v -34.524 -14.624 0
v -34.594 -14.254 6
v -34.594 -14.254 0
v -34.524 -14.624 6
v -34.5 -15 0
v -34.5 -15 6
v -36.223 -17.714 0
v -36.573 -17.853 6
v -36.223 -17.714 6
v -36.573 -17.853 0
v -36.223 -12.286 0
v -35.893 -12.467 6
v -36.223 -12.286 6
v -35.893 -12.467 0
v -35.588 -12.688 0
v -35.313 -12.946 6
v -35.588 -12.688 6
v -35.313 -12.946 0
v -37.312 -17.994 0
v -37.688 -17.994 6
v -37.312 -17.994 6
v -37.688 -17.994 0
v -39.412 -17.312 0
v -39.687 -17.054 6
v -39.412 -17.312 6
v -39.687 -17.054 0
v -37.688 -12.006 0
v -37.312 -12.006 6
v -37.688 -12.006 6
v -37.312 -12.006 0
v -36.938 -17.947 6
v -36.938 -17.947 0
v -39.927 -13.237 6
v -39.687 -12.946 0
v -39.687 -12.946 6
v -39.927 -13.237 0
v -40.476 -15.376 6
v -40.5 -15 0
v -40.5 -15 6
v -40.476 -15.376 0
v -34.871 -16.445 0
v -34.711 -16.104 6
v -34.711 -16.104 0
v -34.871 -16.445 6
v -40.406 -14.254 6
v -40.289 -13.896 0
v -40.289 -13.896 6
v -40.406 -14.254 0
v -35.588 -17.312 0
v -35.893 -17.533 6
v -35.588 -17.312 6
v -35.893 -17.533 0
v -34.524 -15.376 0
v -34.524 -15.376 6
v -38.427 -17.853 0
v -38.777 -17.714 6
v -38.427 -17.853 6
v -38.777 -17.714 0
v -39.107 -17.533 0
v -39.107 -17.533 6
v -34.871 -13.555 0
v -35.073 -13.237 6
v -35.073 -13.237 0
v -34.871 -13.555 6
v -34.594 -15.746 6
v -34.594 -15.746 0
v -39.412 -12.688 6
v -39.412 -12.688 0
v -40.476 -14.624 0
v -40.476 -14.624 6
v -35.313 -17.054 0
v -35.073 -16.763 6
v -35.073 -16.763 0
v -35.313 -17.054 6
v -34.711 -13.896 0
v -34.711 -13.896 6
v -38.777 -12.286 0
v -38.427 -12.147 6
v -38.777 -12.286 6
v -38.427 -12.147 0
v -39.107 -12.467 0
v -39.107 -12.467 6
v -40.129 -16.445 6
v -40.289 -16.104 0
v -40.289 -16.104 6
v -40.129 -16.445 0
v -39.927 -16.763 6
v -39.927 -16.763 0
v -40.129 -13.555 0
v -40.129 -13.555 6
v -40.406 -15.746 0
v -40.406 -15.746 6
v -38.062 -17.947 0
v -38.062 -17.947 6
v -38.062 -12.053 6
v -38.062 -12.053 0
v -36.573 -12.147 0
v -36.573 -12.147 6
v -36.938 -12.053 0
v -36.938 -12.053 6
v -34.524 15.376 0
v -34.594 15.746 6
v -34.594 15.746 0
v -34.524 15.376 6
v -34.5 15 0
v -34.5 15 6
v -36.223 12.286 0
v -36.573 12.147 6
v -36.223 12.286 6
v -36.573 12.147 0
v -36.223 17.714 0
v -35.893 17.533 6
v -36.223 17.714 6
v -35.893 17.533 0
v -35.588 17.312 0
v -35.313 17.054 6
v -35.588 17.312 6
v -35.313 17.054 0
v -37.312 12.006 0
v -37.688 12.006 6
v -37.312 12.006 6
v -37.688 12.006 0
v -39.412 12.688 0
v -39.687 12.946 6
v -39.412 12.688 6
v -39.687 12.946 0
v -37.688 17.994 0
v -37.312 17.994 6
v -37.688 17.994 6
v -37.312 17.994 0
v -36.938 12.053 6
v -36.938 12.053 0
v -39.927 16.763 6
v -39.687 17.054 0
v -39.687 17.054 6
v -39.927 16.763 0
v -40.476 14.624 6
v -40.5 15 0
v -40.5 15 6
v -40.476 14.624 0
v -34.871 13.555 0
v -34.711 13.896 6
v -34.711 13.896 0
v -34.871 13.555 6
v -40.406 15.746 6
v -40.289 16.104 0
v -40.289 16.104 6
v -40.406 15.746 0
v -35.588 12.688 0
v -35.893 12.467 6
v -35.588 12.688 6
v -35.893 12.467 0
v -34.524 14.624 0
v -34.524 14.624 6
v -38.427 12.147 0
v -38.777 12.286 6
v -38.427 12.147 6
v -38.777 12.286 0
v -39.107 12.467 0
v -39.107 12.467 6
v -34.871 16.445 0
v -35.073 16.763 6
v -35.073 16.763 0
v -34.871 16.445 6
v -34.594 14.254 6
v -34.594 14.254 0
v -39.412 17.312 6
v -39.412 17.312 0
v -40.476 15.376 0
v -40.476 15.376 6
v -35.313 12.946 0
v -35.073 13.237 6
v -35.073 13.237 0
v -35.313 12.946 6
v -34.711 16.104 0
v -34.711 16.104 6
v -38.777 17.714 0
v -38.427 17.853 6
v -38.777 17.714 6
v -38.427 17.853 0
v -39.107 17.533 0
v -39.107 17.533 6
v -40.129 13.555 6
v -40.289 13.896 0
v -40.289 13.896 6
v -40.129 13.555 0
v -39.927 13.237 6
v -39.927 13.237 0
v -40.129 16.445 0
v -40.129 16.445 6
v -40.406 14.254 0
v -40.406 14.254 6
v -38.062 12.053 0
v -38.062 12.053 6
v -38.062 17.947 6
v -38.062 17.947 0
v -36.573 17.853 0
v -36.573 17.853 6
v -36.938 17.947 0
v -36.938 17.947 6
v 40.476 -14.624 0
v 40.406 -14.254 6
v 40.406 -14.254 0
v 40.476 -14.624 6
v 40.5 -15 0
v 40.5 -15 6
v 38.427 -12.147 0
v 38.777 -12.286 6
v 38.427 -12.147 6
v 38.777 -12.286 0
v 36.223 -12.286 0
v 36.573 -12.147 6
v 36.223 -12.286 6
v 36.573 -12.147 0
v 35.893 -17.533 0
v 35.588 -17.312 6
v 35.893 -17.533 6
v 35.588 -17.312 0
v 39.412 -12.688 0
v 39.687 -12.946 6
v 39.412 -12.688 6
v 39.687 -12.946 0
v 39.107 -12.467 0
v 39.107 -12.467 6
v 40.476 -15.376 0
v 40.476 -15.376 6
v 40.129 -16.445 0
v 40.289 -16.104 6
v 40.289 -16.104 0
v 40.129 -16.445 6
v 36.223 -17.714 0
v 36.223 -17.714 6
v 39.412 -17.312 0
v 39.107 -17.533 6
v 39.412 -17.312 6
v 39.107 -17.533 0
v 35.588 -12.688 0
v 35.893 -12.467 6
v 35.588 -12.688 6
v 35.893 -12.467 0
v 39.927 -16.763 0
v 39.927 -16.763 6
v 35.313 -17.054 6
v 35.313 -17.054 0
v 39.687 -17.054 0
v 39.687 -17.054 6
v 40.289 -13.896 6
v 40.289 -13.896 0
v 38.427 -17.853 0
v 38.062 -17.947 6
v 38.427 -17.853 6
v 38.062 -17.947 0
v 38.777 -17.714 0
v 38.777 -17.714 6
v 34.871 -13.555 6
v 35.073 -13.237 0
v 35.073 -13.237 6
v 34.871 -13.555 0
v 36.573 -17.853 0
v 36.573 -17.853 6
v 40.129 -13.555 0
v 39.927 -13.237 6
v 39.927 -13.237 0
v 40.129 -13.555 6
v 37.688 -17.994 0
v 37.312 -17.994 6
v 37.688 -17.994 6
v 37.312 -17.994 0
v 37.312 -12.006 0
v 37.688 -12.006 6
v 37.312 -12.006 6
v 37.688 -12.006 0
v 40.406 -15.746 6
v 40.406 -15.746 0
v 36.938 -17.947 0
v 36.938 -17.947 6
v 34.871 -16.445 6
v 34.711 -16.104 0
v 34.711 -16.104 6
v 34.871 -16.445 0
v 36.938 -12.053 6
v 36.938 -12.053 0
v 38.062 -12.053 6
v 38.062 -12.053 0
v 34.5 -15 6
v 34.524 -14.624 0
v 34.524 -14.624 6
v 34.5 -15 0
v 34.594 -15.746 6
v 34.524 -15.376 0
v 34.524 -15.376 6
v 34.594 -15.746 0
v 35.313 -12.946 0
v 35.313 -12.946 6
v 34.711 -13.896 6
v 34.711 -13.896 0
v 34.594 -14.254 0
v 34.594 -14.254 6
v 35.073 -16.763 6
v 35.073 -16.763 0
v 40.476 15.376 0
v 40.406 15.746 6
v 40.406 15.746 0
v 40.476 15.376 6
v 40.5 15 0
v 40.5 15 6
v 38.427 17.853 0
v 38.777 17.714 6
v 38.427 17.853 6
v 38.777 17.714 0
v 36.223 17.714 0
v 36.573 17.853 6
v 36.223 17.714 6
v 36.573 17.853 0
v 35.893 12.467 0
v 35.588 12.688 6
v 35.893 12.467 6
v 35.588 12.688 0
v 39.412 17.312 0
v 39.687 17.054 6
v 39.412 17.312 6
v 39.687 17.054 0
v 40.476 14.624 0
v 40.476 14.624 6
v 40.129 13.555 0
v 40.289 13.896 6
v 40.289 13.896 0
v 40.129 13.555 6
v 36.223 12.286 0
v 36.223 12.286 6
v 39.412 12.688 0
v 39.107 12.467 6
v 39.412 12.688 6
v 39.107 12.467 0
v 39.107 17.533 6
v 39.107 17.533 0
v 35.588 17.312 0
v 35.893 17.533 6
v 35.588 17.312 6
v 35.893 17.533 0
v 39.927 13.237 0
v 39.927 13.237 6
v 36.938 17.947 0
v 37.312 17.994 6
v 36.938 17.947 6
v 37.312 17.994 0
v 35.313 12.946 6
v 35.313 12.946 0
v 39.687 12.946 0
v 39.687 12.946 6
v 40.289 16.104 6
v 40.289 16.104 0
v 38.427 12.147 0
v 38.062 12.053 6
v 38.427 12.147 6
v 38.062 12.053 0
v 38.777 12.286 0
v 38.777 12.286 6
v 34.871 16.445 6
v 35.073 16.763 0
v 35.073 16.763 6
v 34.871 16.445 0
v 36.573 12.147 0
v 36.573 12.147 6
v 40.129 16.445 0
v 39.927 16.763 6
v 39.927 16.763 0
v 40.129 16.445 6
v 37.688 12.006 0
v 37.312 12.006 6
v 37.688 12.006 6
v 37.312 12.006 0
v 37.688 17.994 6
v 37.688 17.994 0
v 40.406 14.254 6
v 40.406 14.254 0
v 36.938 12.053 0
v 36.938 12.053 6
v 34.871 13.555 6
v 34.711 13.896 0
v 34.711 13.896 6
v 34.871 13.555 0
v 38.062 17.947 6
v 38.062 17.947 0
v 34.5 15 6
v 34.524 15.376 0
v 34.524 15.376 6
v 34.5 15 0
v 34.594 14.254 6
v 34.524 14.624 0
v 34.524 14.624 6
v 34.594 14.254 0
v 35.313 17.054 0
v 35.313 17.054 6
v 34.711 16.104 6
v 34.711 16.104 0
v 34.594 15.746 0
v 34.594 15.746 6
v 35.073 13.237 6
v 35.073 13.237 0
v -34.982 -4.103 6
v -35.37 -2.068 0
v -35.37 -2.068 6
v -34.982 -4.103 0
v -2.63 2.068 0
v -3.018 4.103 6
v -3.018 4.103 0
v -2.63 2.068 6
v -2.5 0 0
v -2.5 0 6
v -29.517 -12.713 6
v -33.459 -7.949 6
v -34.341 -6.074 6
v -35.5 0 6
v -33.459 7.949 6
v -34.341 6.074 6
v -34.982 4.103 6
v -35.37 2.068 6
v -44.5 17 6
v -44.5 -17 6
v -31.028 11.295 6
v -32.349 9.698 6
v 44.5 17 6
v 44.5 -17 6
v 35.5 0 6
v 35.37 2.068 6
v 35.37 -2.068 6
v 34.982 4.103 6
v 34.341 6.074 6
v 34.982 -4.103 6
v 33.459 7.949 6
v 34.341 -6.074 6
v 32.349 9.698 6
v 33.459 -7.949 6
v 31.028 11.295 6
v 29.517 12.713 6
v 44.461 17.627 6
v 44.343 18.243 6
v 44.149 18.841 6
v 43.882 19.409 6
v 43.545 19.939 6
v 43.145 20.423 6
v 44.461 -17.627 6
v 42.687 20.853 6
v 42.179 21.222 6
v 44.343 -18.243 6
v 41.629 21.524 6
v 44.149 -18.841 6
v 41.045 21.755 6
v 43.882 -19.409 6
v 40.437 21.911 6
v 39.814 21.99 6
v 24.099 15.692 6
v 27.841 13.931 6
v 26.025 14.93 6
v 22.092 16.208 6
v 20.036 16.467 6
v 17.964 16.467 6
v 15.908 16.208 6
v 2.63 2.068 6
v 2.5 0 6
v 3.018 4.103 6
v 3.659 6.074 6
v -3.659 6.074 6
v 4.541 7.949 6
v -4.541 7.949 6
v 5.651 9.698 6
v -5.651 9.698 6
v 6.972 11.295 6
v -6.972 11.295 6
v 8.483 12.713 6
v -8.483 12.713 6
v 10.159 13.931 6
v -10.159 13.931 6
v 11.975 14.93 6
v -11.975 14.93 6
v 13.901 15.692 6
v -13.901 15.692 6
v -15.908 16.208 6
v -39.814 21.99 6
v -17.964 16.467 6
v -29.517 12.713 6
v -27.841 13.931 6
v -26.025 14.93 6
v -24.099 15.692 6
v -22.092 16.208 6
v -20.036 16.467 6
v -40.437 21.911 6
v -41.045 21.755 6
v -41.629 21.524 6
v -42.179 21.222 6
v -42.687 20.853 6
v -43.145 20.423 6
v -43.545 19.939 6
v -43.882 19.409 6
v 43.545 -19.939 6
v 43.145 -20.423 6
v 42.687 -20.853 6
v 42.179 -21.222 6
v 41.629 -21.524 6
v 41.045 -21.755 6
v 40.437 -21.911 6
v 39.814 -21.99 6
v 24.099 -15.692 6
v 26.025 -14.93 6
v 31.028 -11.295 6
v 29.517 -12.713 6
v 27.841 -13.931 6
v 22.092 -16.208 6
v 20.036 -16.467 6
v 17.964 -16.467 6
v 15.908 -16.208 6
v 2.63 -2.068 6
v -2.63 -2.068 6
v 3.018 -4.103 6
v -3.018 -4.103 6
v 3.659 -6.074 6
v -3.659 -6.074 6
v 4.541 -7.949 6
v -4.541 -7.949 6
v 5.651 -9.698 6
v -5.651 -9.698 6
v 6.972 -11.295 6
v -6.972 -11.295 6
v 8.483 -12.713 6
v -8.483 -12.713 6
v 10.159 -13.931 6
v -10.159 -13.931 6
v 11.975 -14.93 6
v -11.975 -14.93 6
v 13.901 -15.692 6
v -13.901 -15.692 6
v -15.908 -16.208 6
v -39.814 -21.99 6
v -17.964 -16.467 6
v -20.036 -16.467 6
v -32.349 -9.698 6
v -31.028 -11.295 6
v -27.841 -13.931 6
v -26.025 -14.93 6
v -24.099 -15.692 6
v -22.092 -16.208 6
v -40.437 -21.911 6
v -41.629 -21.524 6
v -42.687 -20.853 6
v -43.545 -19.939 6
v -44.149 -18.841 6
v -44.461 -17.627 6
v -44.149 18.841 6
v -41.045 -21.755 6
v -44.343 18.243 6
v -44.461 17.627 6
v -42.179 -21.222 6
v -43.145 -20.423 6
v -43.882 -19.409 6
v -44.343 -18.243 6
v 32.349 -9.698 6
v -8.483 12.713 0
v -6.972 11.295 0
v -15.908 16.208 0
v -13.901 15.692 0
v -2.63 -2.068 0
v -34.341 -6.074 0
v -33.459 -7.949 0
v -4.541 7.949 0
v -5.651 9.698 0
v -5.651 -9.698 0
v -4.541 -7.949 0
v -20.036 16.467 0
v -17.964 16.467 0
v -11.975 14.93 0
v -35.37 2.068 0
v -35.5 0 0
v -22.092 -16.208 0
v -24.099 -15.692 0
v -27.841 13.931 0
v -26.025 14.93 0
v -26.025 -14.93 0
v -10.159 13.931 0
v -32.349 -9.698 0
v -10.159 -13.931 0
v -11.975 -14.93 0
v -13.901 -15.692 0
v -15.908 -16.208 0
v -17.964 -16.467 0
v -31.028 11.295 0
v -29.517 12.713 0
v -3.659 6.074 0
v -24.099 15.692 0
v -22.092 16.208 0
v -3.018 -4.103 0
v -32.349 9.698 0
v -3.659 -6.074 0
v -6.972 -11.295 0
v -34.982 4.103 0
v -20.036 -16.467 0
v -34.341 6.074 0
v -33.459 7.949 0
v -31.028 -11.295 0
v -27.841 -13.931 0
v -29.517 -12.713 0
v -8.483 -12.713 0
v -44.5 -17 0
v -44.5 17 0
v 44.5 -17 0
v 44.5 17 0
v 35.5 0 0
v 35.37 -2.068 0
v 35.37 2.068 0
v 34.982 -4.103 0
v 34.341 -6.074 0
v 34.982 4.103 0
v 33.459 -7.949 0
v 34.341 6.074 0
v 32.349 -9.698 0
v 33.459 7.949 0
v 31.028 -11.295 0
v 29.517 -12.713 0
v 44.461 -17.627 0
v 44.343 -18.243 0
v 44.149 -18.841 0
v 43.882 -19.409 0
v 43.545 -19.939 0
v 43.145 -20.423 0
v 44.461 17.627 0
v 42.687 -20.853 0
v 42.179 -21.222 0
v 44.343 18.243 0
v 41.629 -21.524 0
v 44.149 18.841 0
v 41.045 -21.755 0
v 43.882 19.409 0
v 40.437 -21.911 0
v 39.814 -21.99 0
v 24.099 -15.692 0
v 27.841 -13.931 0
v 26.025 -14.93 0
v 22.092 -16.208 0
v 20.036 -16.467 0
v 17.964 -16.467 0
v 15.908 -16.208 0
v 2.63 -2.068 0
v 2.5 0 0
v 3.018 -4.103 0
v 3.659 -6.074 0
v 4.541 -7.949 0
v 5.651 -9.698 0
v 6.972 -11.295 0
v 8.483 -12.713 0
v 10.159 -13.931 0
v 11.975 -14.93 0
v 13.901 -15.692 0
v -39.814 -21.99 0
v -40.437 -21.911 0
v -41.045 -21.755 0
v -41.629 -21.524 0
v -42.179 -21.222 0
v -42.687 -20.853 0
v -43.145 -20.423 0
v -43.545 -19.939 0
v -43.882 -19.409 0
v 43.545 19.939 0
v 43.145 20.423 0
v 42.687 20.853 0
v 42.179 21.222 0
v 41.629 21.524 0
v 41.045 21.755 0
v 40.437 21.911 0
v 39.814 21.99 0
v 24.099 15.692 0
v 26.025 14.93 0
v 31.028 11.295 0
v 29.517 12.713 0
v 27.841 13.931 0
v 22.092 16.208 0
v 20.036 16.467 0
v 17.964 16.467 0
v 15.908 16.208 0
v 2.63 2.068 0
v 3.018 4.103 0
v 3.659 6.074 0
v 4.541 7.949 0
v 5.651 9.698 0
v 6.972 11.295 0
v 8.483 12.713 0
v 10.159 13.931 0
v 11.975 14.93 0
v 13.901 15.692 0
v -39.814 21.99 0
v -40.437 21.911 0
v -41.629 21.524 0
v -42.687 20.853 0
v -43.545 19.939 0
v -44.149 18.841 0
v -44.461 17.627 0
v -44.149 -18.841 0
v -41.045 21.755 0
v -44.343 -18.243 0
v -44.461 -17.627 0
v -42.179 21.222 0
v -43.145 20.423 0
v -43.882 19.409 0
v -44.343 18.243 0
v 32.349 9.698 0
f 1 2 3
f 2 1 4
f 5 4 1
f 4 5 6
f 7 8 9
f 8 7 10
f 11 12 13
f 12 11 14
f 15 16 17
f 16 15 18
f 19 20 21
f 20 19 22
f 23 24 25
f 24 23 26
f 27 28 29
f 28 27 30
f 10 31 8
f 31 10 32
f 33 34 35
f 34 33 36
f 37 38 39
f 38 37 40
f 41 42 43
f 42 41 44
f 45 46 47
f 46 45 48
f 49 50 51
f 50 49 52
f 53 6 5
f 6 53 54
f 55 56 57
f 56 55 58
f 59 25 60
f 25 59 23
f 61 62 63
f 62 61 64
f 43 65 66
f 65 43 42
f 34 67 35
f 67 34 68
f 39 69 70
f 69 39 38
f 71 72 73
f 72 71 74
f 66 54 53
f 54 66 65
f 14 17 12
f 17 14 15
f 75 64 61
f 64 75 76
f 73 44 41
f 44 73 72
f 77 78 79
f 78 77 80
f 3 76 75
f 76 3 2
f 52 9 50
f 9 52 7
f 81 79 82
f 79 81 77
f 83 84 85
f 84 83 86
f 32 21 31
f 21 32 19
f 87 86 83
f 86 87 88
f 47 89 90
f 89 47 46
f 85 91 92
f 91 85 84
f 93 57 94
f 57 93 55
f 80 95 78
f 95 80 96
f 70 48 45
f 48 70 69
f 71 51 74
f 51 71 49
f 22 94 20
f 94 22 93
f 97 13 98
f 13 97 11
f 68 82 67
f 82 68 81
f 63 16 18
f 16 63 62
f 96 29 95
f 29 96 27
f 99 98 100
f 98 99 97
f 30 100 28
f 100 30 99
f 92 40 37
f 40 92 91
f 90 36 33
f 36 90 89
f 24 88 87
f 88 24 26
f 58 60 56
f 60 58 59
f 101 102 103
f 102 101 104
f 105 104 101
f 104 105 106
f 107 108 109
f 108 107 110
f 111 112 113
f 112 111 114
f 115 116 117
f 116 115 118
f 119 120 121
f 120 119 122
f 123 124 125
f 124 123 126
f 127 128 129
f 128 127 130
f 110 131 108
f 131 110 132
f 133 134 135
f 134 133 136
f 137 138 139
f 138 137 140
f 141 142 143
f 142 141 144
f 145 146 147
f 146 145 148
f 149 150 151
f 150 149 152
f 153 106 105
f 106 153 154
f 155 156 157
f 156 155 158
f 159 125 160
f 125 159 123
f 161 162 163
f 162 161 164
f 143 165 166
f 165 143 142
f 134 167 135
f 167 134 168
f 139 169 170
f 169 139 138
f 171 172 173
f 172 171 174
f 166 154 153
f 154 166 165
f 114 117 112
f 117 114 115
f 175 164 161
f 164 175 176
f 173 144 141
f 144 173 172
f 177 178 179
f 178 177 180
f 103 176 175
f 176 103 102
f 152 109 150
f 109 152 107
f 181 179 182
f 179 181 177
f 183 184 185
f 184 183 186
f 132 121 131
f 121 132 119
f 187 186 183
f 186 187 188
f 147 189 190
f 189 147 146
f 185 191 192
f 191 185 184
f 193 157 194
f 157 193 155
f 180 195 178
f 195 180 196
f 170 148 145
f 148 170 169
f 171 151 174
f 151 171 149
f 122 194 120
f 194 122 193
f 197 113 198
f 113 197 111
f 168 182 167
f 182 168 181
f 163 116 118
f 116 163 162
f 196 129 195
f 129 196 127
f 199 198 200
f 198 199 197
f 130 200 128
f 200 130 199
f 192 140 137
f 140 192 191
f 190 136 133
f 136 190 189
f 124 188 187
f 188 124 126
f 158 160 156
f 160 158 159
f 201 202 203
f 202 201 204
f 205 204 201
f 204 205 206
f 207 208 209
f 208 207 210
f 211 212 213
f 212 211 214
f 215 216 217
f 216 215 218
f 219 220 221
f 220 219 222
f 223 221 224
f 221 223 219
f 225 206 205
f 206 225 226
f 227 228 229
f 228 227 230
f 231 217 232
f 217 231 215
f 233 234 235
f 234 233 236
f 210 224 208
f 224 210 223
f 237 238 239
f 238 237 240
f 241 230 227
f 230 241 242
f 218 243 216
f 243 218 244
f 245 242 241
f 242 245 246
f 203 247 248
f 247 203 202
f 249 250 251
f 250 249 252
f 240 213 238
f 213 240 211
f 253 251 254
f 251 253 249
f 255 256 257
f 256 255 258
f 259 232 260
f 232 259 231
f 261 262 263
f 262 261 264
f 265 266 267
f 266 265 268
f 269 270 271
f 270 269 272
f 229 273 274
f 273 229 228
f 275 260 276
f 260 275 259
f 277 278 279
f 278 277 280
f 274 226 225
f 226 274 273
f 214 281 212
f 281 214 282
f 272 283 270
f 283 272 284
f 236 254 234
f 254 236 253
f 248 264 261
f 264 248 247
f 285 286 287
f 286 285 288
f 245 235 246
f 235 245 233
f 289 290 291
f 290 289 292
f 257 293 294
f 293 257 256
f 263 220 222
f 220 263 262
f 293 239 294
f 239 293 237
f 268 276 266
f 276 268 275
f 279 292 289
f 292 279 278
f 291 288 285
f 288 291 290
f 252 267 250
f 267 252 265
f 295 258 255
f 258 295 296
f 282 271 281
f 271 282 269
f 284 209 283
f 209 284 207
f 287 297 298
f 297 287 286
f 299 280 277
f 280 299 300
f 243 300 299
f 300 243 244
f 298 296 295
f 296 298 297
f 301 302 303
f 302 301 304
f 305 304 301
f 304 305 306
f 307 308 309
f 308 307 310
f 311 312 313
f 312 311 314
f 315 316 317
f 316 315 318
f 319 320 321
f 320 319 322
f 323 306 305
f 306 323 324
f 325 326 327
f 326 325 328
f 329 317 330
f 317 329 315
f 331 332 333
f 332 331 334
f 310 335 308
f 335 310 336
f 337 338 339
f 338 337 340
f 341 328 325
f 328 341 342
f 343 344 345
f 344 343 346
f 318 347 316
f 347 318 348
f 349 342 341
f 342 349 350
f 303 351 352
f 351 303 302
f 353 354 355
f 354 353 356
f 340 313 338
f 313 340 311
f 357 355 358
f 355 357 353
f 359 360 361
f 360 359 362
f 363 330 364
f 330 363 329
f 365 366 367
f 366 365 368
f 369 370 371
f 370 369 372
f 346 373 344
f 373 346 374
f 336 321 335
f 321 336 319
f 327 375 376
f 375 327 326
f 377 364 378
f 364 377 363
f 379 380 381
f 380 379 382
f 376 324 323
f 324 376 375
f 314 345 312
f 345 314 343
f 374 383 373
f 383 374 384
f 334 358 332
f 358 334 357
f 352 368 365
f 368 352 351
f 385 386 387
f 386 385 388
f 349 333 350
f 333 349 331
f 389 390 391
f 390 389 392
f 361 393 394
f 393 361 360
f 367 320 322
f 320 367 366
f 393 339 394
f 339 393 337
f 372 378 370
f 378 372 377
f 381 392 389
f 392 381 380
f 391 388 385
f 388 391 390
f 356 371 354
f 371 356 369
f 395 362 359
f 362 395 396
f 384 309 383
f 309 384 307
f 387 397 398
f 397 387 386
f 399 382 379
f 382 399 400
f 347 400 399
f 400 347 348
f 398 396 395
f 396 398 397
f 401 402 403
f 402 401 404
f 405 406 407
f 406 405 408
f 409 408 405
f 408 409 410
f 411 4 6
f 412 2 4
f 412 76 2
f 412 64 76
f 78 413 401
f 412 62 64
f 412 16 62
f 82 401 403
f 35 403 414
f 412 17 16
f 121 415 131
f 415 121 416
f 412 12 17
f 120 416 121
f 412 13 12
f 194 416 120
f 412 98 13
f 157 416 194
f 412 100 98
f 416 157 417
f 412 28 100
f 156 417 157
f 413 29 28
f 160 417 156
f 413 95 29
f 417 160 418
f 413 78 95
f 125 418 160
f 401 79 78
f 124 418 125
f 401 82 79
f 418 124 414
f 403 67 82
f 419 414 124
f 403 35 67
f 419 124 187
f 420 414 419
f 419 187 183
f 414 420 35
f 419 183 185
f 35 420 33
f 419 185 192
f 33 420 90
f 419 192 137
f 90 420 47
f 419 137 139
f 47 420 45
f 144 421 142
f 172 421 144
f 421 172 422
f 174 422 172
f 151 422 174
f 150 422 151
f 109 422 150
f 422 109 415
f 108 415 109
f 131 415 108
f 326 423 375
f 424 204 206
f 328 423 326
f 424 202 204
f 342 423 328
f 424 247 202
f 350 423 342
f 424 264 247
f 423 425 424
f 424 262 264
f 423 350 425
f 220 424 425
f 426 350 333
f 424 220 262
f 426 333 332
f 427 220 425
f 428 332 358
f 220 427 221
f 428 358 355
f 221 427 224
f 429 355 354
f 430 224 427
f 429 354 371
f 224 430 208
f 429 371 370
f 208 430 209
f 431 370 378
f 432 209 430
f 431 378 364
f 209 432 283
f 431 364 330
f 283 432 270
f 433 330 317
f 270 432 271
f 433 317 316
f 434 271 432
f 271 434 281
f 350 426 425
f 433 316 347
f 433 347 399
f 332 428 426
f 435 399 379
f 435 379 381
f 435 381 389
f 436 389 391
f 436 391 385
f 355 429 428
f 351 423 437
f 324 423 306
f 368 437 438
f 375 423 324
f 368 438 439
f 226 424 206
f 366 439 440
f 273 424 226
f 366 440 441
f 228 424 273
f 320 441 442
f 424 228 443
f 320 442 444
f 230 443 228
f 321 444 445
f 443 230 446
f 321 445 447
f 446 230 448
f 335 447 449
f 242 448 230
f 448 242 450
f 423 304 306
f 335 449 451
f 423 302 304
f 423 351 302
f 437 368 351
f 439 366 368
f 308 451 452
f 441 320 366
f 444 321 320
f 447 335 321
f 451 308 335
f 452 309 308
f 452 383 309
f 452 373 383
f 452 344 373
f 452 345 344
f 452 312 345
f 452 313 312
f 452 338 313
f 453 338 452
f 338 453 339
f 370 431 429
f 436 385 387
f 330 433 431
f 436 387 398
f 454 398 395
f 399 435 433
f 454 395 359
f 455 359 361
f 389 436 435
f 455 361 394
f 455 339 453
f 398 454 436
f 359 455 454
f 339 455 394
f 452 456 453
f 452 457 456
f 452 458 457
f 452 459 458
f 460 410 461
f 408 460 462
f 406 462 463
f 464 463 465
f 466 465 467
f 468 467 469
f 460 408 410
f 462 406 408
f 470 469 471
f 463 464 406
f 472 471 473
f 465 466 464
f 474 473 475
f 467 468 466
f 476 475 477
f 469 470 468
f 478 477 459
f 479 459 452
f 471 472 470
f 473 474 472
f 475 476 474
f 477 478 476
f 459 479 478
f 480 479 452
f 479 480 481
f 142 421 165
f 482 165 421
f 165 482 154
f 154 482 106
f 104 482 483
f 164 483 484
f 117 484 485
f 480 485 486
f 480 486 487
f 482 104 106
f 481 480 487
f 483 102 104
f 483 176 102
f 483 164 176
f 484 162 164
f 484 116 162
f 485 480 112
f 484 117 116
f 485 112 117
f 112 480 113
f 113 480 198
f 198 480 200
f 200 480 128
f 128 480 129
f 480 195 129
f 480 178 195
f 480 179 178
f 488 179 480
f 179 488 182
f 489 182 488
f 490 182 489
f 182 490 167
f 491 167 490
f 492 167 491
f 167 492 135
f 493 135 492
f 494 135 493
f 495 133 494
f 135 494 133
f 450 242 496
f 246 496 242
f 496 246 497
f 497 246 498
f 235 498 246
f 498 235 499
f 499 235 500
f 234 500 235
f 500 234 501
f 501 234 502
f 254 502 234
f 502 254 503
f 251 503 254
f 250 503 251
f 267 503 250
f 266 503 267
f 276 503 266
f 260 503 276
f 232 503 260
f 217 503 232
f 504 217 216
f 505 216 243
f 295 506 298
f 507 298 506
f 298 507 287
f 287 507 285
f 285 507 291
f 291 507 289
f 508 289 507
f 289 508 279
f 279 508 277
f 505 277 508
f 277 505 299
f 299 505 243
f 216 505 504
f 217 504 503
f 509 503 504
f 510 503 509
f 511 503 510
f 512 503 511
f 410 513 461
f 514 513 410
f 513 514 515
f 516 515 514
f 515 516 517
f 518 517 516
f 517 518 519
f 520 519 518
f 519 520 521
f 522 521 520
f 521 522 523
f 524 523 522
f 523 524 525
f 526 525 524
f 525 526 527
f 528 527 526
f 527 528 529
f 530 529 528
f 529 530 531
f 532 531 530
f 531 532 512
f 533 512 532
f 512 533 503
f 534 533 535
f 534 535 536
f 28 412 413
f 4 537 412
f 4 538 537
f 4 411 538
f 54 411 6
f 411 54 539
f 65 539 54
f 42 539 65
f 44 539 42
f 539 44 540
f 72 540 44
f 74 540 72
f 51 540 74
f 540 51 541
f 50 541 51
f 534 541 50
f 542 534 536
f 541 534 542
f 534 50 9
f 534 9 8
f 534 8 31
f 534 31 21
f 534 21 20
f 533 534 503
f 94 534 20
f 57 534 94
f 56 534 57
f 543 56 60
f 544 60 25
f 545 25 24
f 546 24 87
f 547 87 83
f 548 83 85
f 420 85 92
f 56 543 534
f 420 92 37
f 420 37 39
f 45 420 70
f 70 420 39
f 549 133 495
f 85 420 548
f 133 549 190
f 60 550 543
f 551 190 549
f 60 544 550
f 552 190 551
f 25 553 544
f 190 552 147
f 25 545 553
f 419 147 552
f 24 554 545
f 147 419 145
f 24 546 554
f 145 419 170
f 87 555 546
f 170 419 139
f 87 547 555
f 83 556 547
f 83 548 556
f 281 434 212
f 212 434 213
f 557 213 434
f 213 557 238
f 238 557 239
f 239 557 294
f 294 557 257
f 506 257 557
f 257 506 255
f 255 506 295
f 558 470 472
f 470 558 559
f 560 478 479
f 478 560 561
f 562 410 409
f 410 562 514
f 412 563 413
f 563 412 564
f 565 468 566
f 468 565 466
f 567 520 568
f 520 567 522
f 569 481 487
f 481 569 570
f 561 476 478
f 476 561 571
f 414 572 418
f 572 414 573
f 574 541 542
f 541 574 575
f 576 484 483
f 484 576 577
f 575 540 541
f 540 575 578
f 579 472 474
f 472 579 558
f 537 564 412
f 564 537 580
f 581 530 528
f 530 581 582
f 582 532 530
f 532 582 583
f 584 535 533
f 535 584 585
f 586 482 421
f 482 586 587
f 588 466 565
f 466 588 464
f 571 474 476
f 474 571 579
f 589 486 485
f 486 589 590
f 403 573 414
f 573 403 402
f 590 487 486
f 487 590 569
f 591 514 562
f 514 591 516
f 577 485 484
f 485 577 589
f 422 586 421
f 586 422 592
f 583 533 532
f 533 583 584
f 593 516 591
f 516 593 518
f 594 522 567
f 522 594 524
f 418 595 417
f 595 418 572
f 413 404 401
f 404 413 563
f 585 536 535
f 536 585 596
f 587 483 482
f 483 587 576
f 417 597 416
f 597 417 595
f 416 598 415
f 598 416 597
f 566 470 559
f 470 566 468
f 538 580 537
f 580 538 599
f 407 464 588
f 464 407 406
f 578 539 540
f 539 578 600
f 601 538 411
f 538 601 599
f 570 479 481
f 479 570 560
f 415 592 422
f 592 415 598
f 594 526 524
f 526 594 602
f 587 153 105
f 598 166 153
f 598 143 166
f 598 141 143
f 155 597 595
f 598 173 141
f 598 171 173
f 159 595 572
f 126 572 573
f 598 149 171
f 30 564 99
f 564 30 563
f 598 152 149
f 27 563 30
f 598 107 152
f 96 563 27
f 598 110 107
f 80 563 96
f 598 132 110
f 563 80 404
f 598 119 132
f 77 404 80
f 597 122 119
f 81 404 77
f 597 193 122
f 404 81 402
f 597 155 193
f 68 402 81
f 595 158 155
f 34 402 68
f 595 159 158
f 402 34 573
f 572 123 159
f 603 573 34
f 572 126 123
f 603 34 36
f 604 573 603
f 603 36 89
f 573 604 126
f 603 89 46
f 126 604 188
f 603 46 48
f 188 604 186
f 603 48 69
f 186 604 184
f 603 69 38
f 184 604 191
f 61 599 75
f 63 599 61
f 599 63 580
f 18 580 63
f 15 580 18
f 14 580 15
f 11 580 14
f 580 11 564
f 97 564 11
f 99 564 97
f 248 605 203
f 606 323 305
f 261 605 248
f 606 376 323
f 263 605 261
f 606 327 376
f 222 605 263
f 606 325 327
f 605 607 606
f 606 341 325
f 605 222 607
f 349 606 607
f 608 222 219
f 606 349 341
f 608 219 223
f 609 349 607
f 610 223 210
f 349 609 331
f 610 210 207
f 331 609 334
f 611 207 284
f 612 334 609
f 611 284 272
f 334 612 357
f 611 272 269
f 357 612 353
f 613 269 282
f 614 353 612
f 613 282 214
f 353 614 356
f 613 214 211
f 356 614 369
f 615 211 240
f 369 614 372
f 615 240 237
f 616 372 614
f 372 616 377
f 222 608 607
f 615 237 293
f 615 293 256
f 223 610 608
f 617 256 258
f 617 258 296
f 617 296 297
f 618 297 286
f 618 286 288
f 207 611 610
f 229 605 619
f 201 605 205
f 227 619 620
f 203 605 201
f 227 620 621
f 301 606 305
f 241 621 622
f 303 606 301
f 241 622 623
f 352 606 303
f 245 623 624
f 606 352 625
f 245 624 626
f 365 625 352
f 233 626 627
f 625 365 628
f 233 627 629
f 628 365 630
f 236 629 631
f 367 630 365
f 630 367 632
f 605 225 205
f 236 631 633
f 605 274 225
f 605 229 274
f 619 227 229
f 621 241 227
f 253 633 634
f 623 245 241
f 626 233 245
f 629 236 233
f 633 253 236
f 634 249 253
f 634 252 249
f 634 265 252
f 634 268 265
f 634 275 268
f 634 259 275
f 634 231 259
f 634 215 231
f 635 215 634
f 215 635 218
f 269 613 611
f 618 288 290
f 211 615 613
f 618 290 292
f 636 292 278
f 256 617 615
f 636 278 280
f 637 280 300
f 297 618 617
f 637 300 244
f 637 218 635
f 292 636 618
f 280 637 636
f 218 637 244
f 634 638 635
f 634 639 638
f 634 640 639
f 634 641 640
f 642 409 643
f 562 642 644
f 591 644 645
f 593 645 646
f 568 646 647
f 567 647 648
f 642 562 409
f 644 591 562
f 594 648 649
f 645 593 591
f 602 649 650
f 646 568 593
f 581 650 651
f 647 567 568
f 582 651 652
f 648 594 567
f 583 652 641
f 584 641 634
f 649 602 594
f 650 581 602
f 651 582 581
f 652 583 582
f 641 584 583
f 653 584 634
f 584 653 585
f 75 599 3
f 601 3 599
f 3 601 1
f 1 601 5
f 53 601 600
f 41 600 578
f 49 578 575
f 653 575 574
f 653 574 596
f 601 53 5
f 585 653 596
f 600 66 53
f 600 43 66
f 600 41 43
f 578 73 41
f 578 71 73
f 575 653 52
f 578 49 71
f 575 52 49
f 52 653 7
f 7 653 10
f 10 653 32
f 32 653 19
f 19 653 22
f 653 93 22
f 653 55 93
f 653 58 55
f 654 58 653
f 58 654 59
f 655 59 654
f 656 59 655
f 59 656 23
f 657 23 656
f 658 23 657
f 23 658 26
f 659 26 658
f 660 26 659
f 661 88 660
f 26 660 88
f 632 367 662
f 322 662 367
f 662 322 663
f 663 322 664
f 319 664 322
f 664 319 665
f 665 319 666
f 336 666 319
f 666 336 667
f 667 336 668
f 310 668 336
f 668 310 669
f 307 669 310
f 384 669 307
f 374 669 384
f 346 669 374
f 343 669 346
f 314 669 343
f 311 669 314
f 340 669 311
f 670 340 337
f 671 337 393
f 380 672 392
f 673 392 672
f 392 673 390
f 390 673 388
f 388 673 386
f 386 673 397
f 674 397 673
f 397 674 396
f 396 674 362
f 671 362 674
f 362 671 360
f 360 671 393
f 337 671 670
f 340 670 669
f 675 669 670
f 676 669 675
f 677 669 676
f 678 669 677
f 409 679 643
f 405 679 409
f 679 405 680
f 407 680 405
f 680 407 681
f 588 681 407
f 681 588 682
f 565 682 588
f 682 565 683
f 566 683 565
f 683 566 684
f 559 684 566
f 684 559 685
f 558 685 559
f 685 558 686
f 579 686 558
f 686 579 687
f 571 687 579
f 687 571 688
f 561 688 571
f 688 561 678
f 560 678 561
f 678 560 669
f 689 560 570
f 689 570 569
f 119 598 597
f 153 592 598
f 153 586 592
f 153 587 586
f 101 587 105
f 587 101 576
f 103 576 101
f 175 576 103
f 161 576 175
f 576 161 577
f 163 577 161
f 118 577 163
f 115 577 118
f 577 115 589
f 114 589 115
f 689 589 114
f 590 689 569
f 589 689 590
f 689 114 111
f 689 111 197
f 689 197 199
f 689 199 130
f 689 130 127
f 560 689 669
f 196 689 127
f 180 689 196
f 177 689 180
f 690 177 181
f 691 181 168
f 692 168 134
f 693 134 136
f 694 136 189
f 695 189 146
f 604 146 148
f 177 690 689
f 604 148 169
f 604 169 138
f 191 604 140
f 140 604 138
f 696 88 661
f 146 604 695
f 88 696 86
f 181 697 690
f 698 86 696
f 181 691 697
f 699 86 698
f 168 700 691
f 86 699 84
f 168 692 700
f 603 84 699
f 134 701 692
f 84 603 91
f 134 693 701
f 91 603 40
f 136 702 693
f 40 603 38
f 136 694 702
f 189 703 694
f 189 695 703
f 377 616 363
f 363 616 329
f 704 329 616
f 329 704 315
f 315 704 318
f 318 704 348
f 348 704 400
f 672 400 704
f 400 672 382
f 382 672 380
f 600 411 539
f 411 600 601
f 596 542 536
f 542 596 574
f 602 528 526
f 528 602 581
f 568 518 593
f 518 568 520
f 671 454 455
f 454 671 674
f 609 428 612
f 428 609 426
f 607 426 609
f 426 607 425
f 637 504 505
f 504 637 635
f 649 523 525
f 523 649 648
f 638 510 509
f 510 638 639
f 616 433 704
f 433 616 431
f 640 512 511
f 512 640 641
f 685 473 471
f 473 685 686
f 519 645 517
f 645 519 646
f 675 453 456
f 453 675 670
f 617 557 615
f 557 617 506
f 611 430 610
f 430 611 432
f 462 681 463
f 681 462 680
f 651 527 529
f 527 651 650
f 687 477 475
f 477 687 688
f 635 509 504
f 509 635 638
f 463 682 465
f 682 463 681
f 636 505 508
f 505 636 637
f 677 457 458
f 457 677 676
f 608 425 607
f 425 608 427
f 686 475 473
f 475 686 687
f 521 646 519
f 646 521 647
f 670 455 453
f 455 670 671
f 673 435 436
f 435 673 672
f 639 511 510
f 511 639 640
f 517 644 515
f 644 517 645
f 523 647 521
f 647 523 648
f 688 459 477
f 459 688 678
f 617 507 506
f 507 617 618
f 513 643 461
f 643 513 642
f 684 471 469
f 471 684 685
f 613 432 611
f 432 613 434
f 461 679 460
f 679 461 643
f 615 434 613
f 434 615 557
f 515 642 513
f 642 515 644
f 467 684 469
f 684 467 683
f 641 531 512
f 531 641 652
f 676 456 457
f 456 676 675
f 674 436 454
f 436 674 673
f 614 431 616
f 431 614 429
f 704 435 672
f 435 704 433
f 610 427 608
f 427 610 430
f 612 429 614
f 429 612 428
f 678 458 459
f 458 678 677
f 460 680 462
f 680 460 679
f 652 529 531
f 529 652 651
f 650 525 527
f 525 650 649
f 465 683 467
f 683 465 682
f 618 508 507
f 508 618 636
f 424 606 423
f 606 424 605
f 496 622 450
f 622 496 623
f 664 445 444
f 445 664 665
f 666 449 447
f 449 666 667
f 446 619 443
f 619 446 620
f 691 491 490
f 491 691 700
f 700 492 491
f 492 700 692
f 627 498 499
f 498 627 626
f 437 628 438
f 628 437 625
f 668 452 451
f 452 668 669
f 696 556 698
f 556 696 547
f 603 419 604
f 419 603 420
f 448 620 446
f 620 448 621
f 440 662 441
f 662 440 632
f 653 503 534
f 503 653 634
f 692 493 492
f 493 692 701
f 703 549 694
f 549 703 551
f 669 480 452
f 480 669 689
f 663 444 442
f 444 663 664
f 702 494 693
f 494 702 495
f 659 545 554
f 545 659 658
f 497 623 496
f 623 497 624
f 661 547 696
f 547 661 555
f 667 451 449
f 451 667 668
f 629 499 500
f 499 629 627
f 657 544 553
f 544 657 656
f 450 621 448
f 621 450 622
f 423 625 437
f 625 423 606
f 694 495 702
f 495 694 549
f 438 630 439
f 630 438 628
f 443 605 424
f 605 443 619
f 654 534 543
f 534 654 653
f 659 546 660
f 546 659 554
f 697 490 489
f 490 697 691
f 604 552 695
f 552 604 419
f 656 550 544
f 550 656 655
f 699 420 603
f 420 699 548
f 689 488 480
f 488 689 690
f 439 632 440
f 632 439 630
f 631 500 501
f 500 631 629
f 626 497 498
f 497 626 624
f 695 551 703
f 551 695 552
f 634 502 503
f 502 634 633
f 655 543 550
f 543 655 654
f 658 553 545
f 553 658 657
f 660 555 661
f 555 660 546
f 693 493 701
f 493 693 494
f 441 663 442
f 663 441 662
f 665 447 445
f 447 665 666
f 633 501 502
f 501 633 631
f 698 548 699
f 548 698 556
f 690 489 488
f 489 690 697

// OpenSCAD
$fn = 50;


difference() {
	union() {
		hull() {
			translate(v = [-39.5000000000, 17.0000000000, 0]) {
				cylinder(h = 6, r = 5);
			}
			translate(v = [39.5000000000, 17.0000000000, 0]) {
				cylinder(h = 6, r = 5);
			}
			translate(v = [-39.5000000000, -17.0000000000, 0]) {
				cylinder(h = 6, r = 5);
			}
			translate(v = [39.5000000000, -17.0000000000, 0]) {
				cylinder(h = 6, r = 5);
			}
		}
	}
	union() {
		#translate(v = [-37.5000000000, -15.0000000000, -100.0000000000]) {
			cylinder(h = 200, r = 3.0000000000);
		}
		#translate(v = [-37.5000000000, 15.0000000000, -100.0000000000]) {
			cylinder(h = 200, r = 3.0000000000);
		}
		#translate(v = [37.5000000000, -15.0000000000, -100.0000000000]) {
			cylinder(h = 200, r = 3.0000000000);
		}
		#translate(v = [37.5000000000, 15.0000000000, -100.0000000000]) {
			cylinder(h = 200, r = 3.0000000000);
		}
		#translate(v = [-19.0000000000, 0, 0]) {
			cylinder(h = 6, r = 16.5000000000);
		}
		#translate(v = [19.0000000000, 0, 0]) {
			cylinder(h = 6, r = 16.5000000000);
		}
	}
}
